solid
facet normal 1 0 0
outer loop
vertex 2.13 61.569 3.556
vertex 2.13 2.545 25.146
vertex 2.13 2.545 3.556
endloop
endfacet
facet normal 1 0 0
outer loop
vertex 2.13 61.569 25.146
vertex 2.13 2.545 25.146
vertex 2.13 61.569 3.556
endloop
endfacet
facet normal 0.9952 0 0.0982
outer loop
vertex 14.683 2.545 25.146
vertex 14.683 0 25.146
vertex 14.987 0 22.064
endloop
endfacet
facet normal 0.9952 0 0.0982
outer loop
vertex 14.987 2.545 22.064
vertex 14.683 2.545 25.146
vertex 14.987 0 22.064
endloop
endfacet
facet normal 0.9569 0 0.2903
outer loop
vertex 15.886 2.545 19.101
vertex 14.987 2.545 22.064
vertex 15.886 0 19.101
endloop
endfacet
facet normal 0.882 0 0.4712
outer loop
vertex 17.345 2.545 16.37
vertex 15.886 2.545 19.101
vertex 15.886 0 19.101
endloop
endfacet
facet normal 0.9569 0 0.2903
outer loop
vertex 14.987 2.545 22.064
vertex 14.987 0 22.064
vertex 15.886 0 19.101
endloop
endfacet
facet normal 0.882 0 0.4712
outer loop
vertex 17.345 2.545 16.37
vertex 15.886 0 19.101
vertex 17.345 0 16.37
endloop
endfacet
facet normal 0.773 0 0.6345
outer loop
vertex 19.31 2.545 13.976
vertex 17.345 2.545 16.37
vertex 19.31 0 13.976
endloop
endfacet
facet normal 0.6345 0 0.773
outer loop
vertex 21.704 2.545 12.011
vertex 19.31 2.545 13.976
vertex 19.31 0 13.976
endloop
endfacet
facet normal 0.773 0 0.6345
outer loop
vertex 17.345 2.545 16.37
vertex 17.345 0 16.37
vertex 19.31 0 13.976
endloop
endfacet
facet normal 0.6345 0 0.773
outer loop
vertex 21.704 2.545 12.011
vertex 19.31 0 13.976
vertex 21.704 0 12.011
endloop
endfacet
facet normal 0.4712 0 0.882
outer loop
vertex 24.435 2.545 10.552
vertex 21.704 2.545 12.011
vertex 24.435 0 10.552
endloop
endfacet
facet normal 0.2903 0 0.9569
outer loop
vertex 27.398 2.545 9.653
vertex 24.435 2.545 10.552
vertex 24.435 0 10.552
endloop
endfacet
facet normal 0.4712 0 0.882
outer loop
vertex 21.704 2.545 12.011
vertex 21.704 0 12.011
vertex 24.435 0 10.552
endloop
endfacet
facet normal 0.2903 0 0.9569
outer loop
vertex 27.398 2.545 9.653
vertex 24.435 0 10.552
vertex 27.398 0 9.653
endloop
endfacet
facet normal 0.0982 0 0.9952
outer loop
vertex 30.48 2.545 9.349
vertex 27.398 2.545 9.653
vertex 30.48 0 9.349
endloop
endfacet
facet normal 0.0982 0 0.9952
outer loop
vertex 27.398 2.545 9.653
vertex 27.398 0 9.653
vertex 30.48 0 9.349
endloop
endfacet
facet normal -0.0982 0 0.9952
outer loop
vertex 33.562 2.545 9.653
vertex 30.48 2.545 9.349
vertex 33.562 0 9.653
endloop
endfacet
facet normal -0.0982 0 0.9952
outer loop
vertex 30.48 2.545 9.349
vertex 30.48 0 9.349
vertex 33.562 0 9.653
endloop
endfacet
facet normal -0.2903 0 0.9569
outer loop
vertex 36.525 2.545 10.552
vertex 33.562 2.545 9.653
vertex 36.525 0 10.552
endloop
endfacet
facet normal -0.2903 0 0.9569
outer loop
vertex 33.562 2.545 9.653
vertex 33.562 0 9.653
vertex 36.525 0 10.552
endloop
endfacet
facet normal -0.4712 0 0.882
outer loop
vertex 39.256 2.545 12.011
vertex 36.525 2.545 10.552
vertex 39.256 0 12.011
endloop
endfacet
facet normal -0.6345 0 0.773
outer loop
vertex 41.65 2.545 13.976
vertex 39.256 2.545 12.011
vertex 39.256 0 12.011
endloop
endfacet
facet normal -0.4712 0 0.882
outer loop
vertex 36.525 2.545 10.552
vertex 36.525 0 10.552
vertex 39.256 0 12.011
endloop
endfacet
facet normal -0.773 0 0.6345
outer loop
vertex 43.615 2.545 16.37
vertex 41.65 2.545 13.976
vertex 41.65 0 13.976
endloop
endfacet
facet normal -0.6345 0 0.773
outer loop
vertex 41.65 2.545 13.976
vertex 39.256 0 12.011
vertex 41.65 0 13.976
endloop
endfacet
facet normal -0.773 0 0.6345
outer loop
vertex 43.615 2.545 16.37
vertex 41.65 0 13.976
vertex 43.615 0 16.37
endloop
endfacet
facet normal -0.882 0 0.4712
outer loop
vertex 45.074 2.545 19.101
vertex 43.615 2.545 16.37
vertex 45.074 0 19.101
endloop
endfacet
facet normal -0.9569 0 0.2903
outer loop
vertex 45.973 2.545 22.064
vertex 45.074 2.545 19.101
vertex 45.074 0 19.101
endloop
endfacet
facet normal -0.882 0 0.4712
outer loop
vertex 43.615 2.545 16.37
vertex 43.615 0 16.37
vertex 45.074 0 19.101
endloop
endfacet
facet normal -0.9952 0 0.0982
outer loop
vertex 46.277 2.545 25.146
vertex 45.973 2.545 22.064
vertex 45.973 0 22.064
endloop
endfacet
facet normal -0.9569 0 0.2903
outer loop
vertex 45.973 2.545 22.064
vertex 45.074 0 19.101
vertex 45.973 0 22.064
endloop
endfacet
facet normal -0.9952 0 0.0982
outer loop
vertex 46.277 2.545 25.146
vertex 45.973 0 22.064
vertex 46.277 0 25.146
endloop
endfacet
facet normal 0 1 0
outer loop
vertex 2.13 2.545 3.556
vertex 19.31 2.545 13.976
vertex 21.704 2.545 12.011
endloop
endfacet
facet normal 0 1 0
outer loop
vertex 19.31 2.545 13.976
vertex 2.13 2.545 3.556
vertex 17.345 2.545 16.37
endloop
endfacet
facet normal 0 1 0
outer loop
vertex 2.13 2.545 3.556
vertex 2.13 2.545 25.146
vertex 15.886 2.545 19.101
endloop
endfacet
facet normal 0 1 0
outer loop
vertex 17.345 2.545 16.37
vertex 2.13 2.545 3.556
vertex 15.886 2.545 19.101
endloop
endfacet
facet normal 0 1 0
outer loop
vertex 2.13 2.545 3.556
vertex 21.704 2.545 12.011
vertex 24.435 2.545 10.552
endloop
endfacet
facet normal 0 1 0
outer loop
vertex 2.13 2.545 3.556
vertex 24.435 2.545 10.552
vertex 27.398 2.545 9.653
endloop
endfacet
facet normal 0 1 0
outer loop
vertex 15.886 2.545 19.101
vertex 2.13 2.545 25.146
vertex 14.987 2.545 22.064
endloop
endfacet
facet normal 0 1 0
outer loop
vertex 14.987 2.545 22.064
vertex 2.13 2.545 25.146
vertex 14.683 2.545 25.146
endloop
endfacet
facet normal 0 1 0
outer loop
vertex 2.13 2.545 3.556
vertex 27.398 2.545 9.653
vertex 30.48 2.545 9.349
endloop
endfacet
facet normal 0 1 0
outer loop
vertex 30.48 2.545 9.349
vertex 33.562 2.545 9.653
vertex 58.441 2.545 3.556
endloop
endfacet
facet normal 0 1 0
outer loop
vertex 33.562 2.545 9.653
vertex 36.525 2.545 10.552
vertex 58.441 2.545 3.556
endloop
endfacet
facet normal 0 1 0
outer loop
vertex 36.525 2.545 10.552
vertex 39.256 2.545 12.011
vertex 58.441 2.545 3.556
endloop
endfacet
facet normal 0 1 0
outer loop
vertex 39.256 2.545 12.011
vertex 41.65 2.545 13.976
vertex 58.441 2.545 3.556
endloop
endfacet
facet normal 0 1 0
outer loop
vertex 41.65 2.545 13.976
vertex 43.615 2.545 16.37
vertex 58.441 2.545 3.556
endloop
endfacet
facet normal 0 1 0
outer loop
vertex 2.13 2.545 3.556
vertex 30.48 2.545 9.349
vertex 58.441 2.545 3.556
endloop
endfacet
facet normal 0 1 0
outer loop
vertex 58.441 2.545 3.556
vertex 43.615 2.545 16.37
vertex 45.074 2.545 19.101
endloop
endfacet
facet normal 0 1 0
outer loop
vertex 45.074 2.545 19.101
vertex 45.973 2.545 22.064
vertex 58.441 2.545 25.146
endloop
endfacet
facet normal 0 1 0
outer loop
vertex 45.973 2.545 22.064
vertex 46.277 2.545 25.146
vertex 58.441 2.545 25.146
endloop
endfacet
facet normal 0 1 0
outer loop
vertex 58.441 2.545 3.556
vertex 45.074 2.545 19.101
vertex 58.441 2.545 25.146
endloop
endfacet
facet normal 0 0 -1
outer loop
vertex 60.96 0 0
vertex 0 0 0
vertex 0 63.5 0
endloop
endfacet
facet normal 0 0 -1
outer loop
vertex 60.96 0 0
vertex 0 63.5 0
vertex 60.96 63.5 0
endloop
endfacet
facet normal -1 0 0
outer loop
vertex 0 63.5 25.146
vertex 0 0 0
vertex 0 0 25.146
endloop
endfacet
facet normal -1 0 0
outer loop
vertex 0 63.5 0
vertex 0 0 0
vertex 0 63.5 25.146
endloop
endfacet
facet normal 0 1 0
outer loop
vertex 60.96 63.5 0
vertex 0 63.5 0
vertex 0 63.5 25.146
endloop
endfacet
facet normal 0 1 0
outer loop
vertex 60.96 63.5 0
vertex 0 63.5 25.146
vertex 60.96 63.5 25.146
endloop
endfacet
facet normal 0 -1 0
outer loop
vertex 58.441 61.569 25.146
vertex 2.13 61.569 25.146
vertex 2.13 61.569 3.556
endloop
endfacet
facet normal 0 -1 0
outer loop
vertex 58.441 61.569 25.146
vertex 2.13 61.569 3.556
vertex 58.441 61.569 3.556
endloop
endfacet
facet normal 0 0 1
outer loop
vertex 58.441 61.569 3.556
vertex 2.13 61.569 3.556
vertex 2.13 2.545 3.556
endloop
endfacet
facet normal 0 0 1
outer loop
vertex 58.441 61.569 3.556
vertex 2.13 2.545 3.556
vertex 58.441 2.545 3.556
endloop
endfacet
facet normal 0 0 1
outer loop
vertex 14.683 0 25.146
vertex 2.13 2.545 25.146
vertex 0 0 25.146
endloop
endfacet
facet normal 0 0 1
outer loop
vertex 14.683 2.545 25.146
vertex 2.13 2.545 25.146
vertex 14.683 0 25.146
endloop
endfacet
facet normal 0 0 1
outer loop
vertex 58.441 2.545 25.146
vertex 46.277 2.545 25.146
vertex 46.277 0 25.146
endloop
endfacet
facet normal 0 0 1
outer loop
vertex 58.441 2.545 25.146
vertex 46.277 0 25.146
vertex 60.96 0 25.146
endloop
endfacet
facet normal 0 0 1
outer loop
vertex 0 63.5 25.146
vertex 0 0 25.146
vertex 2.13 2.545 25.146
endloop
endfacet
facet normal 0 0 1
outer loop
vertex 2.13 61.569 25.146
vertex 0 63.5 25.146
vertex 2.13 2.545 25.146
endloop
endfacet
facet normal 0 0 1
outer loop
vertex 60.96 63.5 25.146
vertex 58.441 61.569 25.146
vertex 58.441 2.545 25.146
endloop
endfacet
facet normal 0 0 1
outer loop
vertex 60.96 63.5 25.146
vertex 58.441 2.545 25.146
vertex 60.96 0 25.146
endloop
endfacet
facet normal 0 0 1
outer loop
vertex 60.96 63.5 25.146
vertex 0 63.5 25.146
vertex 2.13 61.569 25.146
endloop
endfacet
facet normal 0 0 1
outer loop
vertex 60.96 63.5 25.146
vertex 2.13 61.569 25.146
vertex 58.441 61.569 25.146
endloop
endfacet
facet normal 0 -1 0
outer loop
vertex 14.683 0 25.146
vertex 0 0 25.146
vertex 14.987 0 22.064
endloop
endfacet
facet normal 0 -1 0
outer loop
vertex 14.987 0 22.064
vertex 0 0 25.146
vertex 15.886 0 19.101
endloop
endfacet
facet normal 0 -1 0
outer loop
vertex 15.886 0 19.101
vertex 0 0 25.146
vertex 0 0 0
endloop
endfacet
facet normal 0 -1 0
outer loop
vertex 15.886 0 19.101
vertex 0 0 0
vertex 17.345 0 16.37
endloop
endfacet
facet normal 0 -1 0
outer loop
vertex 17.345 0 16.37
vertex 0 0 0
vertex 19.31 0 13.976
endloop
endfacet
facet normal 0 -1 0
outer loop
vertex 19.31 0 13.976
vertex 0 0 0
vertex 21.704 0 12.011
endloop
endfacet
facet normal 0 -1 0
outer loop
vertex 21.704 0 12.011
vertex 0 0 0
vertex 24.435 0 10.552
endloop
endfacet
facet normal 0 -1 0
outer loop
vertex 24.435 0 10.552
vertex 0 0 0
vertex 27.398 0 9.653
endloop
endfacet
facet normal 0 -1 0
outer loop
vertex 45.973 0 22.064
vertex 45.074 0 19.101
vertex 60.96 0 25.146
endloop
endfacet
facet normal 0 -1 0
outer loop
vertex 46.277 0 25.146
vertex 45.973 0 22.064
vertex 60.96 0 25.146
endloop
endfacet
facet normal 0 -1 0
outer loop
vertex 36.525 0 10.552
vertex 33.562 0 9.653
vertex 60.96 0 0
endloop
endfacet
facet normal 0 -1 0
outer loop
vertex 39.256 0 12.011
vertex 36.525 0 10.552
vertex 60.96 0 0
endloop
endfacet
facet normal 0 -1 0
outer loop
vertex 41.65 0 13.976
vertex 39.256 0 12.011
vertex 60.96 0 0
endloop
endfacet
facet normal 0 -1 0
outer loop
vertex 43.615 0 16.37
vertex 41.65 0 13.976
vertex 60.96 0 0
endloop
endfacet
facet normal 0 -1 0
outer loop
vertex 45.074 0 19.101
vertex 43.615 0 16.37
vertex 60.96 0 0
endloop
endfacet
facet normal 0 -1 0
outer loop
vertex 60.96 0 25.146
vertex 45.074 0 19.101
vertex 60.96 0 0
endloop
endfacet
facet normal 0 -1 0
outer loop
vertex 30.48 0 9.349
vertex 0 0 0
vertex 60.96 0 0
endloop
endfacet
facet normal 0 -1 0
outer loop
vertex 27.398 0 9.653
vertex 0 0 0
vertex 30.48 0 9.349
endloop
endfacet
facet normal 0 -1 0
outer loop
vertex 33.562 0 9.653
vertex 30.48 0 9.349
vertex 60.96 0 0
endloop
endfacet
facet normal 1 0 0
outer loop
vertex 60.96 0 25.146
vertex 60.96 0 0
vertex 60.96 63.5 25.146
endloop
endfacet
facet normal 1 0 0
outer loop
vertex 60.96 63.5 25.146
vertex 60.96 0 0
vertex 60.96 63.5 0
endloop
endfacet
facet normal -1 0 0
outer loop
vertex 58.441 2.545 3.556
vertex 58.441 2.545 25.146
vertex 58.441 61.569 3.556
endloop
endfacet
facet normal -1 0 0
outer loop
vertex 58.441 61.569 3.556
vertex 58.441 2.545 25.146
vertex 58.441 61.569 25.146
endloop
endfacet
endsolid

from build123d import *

# Parameters (mm, degrees)
F0_W     = 60.96
F0_H     = 63.5
F1_DEPTH = 25.146
F2_W     = 56.310931
F2_H     = 59.023448
F3_DEPTH = 21.59
F5_DEPTH = 25.4


with BuildPart() as f1:
    # F0 (on Top) → F1 (new body)
    with BuildSketch(Plane.XY):
        with Locations((30.48, 31.75)):
            Rectangle(F0_W, F0_H)
    extrude(amount=F1_DEPTH)

    # F2 (on face) → F3 (cut)
    with BuildSketch(Plane.XY.offset(25.146)):
        with Locations((30.285216, 32.056931)):
            Rectangle(F2_W, F2_H)
    extrude(amount=-F3_DEPTH, mode=Mode.SUBTRACT)

    # F4 (on face) → F5 (cut)
    with BuildSketch(Plane.XZ):
        with BuildLine():
            ThreePointArc((14.683233, 25.146), (30.48, 9.349233), (46.276767, 25.146))
            Line((46.276767, 25.146), (14.683233, 25.146))
        make_face()
    extrude(amount=-F5_DEPTH, mode=Mode.SUBTRACT)


solid = f1.part
